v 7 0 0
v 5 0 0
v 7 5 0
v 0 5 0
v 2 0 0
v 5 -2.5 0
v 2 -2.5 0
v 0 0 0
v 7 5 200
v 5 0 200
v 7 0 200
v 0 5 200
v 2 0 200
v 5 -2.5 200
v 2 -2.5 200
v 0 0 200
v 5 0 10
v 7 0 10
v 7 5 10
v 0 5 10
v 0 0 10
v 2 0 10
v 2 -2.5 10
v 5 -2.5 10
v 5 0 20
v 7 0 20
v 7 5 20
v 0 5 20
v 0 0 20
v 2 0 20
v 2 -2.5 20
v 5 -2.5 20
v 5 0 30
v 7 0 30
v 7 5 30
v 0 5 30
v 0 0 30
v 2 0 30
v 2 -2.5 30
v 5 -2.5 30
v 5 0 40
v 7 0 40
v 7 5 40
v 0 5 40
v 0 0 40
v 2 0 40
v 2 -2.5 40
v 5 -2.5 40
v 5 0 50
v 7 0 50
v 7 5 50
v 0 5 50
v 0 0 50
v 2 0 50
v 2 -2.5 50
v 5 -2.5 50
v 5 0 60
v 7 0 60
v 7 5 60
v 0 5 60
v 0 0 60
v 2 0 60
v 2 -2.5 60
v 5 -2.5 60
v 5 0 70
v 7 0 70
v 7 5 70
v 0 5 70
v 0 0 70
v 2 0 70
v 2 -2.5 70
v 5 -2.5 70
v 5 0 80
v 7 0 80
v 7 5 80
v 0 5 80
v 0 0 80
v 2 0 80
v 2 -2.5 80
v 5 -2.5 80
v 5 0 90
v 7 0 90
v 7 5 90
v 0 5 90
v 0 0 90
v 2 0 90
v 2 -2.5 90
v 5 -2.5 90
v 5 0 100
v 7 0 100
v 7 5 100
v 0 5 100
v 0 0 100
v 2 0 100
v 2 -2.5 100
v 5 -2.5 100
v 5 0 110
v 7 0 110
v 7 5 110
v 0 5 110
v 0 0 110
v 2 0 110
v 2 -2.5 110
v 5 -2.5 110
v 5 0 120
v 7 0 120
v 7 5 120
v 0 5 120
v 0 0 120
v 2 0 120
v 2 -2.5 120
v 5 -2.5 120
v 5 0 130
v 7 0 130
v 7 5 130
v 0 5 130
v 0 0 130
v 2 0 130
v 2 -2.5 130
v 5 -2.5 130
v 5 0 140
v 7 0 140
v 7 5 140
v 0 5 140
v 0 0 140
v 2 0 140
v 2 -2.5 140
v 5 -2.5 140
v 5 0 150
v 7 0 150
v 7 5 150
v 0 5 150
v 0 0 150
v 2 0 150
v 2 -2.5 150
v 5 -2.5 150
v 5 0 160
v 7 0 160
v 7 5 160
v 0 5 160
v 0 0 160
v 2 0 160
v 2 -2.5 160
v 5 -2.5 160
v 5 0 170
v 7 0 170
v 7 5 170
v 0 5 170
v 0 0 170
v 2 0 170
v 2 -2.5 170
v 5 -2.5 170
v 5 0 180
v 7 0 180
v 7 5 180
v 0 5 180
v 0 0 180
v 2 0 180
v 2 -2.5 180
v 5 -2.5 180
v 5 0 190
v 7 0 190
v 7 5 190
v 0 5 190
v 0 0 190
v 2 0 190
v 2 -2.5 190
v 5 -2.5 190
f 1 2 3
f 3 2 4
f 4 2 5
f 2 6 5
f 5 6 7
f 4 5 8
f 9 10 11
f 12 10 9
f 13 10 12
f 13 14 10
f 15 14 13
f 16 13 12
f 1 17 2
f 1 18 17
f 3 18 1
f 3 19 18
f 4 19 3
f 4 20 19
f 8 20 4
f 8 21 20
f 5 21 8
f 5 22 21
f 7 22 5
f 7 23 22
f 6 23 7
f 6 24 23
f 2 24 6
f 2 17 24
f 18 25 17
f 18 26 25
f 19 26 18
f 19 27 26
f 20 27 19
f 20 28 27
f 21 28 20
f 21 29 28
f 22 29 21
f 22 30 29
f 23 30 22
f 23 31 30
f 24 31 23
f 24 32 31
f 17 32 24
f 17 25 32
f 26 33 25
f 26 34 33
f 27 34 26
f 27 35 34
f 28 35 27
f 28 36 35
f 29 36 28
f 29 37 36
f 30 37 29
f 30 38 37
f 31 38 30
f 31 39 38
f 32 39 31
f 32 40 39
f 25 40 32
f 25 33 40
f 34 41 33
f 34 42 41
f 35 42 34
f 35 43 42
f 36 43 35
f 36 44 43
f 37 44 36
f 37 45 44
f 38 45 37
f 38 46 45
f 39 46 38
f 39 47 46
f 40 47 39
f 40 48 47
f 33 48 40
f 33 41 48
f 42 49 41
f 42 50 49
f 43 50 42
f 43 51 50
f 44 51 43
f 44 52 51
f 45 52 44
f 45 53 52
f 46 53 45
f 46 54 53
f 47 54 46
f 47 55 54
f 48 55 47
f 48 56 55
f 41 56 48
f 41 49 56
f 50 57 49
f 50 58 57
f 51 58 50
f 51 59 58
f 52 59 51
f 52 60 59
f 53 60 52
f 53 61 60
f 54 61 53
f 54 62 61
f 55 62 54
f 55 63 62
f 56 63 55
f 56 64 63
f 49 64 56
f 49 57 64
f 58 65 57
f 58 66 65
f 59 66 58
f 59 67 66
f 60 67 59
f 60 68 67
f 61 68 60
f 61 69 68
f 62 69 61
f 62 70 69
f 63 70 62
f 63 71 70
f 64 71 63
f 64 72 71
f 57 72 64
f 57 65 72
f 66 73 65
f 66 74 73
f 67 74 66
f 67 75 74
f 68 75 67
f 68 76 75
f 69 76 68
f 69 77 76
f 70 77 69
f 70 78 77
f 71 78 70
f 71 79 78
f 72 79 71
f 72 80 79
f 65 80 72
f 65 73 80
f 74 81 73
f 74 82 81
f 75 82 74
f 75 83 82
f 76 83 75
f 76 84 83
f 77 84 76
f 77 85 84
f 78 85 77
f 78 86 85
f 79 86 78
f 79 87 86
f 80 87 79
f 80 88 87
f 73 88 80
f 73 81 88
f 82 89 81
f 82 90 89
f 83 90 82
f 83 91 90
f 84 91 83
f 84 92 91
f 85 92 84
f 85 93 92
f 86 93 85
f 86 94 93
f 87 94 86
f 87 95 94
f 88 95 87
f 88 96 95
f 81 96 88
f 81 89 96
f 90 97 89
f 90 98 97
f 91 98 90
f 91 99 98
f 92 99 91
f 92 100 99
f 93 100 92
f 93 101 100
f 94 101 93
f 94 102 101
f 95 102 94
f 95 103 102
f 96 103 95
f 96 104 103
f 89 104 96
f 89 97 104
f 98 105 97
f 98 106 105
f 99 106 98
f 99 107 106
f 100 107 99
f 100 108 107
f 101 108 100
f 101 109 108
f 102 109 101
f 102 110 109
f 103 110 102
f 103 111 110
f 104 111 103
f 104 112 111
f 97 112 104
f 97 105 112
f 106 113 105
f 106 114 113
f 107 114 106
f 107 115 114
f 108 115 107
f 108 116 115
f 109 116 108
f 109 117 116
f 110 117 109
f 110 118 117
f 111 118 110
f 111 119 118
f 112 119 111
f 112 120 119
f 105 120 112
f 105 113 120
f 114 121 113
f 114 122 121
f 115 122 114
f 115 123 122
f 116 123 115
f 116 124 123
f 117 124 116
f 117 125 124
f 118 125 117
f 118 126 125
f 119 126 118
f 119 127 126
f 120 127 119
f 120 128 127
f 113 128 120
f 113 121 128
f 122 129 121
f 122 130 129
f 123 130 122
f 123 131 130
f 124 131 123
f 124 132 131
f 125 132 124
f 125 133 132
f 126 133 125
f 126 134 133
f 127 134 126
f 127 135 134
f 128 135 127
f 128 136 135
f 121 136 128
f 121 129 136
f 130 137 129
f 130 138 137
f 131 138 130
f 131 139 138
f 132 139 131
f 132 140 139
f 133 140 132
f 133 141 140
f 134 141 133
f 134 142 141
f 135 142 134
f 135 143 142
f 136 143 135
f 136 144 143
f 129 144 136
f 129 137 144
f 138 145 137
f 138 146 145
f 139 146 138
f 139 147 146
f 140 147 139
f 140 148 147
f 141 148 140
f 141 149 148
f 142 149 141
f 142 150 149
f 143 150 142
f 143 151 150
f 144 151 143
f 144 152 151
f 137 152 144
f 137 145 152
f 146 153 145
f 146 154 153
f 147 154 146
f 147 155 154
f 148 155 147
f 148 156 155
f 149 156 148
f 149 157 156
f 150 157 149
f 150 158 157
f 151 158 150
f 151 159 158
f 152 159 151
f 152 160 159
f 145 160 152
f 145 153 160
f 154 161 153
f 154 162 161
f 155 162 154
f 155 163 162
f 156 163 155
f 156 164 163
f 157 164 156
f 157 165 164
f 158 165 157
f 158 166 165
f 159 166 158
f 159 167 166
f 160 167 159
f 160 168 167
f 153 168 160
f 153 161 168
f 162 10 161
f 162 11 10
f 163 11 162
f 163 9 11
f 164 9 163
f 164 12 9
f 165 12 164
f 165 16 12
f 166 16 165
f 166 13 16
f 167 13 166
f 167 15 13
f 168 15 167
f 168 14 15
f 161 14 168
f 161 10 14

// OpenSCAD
// file: Parts/Screw.scad
// created by IndiePandaaaaa | Lukas

TOLERANCE = .1;
$fn = $preview ? 30 : 75;

// metric standards                          M1   M2   M3   M4   M5 M6 M7   M8   M9  M10
function screw_metric_corehole(standard) = [.75, 1.6, 2.5, 3.3, 4.2, 5, 6, 6.8, 7.8, 8.5][standard - 1];
function screw_metric_borehole(standard) = [0, 0, 3.4, 4.5, 5.5, 6.6, 0, 9, 0, 11][standard - 1];
function screw_metric_countersunk_height(standard) = [0, 0, 1.7, 2.3, 2.8, 3.3, 0, 4.4, 0, 5.5][standard - 1];
function screw_metric_countersunk_od(standard) = standard * 2;

module screw_metric_countersunk(standard, length, unthreaded_length = 0, borehole_length = 0, tolerance = .15) {
  if (screw_metric_corehole(standard=standard) == 0) echo("ERROR: screw_metric_corehole value has not been set yet.");
  if (screw_metric_borehole(standard=standard) == 0) echo("ERROR: screw_metric_borehole value has not been set yet.");
  if (screw_metric_countersunk_height(standard=standard) == 0) echo("ERROR: screw_metric_countersunk_height value has not been set yet.");

  union() {
    translate(v=[0, 0, -.1]) {
      cylinder(h=.2 + borehole_length, d=screw_metric_countersunk_od(standard) + tolerance, center=false);
      translate(v=[0, 0, -screw_metric_countersunk_height(standard)]) {
        cylinder(h=screw_metric_countersunk_height(standard) + .01, d2=screw_metric_countersunk_od(standard) + tolerance, d1=screw_metric_borehole(standard) + tolerance, center=false);
        translate(v=[0, 0, -.1]) cylinder(h=.1, d=screw_metric_borehole(standard) + tolerance, center=false);
      }
    }
    translate(v=[0, 0, -length]) cylinder(h=length, d=screw_metric_corehole(standard) + tolerance, center=false);

    // unthreaded part
    translate(v=[0, 0, -.1 - screw_metric_countersunk_height(standard) - unthreaded_length]) cylinder(h=unthreaded_length + .1, d=screw_metric_borehole(standard) + tolerance, center=false);
  }
}

// TODO: module metric cylindric head screws

// TODO: module metric rounded head screws

function screw_wood_corehole(diameter) = diameter * 0.75;
function screw_wood_borehole(diameter) = diameter * 1.25;
function screw_wood_countersunk_height(diameter) = diameter * 0.75;

module screw_wood_countersunk(diameter, length, unthreaded_length = 0, tolerance = .15) {
  if (screw_metric_corehole(standard=standard) == 0) echo("ERROR: screw_metric_corehole value has not been set yet.");
  if (screw_metric_borehole(standard=standard) == 0) echo("ERROR: screw_metric_borehole value has not been set yet.");
  if (screw_metric_countersunk_height(standard=standard) == 0) echo("ERROR: screw_metric_countersunk_height value has not been set yet.");

  // TODO: add module for wood screws 
  union(){}
}

// TODO: module wood cylindric head screws

// TODO: module wood rounded head screws

function cone_diameter(diameter) = diameter * 2;
function cone_diameter_cutout(diameter) = diameter * 2 + 0.5;
function cone_height(diameter) = diameter * 0.75;

module screw(diameter, length = 12, cutout_sample = false) {
  module base_model(diameter, length, cone_height, cone_diameter, offset = 0) {
    rotate_extrude(angle=360) {
      polygon(
        [
          [0, 0],
          [(diameter + offset) / 2, 0],
          [(diameter + offset) / 2, (length + offset) - (cone_height + offset)],
          [(cone_diameter + offset) / 2, length + offset],
          [0, length + offset],
        ]
      );
    }
  }

  if (length < diameter) {
    echo("Screw is too short");
    length = diameter + 5;
    echo("New length is: ", length);
  }

  if (!cutout_sample) {
    translate([0, 0, -length])
      difference() {
        base_model(diameter, length, cone_height(diameter), cone_diameter(diameter));

        // top cross part
        translate([0, 0, length - (cone_height(diameter) - diameter / 2) + .1])
          difference() {
            rotate([0, 0, 45])
              rotate_extrude(angle=360) {
                polygon(
                  [
                    [0, 0],
                    [diameter * 1.4 / 2, 0],
                    [cone_diameter(diameter) / 3, cone_height(diameter) - diameter / 2],
                    [0, cone_height(diameter) - diameter / 2],
                  ]
                );
              }
            for (i = [0:1:3]) {
              rotate([0, 0, 90 * i])
                translate([diameter / 3.18 / 2, diameter / 3.18 / 2, 0]) cube(cone_height(diameter));
            }
          }
      }
  } else {
    offset = 0;
    diameter = cone_diameter_cutout(diameter) / 2; // is duplicated by function, used to reduce error
    translate([0, 0, -length - offset / 2]) {
      base_model(diameter, length, cone_height(diameter), cone_diameter(diameter), offset);
      translate([0, 0, length - .005]) cylinder(r=diameter, h=50);
    }
  }
}

module screw_corehole(diameter_screw, diameter_core, unthreaded_length, length = 12) {
  union() {
    screw(diameter=diameter_screw, length=unthreaded_length, cutout_sample=true);
    if (unthreaded_length < diameter_core - .1) {
      translate(v=[0, 0, -diameter_screw * .8]) cylinder(h=diameter_screw, d=diameter_screw + .3, center=false);
    }
    translate([0, 0, -length]) cylinder(d=diameter_core, h=length - unthreaded_length + .1);
  }
}

module screw_with_nut_metric(screw_length, diameter, square_channel = false, tolerance = .1) {
  function od(width) = ( (width / 2) / cos(30)) * 2; // calculates nut diameter from given width
  nut_thickness = [0.8, 1.6, 2.4, 3.2, 4, 5, 5.5, 6.5];
  nut_width = [2.5, 4, 5.5, 7.1, 8.1, 10.1, 11.1, 13.1];

  if (!(0 < diameter && diameter <= 8 && diameter == round(diameter))) {
    echo("module is only defined for integer values from M1 to M8.");
  } else {
    union() {
      if (!square_channel) {
        screw(diameter=diameter, length=screw_length, cutout_sample=true);

        translate([0, 0, -(screw_length * 2 - nut_thickness[diameter - 1])])
          cylinder(d=od(nut_width[diameter - 1]) + tolerance, h=screw_length, $fn=6);
      } else {
        screw(diameter=diameter, length=screw_length + diameter, cutout_sample=true);
        translate([-od(nut_width[diameter - 1]) / 2 - tolerance, -(nut_width[diameter - 1] / 2), -(screw_length)])
          cube([od(nut_width[diameter - 1]) + screw_length, nut_width[diameter - 1] + tolerance, nut_thickness[diameter - 1] + tolerance]);
      }
    }
  }
}

translate(v=[0, 0, 0]) screw(diameter=3.5, length=12, cutout_sample=false);
translate(v=[20, 0, 0]) screw_corehole(diameter_screw=3, diameter_core=2.5, unthreaded_length=15, length=20);
translate(v=[40, 0, 0]) screw_with_nut(screw_length=30, diameter=4, square_channel=false, tolerance=.1);
translate(v=[60, 0, 0]) SCREW_METRIC_COUNTERSUNK(standard=3, length=12, unthreaded_length=5, borehole_length=5);
// main file
// created by IndiePandaaaaa|Lukas
// encoding: utf-8

use <Parts/Screw.scad>

// made for Bosch Professional 216-305d
// model number: 1 609 B07 675

THICKNESS = 3;
TOLERANCE = .1;
CHAMFER = 1.5;
$fn = $preview ? 50 : 100;

// workpiece stop x-axis (measurements from the original workpiece support)
WORKPIECESUPPORT_WIDTH = 148;
WORKPIECESUPPORT_HOOK_DISTANCE = 92.2;
WORKPIECESUPPORT_HEIGHT = 88.1;

// vacuum adapter
VACUUM_OD = 34.2;
SPLITTED_PRINT = true;

module workpiece_stop() {
  workpiecestop_width = WORKPIECESUPPORT_WIDTH;
  workpiecestop_height = 70;
  workpiecestop_hook_distance = WORKPIECESUPPORT_HOOK_DISTANCE;

  hook_width = 11.1;
  hook_depth = 6.8;
  hook_height = 12.3;
  base_material_thickness = 2.3;

  module bosch_hook() {
    top_thickness = 1.6;
    hollow_depth = 2.85;
    hollow_height = 5.3;
    inner_piece_width = 7.5;
    translate([-base_material_thickness, hook_width, 0]) rotate([90, 0, 0]) union() {
      linear_extrude(hook_width) {
        polygon([
            [0, 0],
            [base_material_thickness, 0],
            [base_material_thickness, hook_height - top_thickness],
            [base_material_thickness + hollow_depth, hook_height - top_thickness],
            [base_material_thickness + hollow_depth, 0],
            [base_material_thickness + hook_depth, 0],
            [base_material_thickness + hook_depth, hook_height],
            [0, hook_height],
          ]);
      }
      translate([hook_depth, hook_height, hook_width]) rotate([0, 90, 180]) linear_extrude(hook_depth) {
        distance_to_center = (hook_width - inner_piece_width) / 2;
        polygon([
            [0, 0],
            [distance_to_center, 0],
            [distance_to_center, hook_height - hollow_height],
            [distance_to_center + inner_piece_width, hook_height - hollow_height],
            [distance_to_center + inner_piece_width, 0],
          ]);
      }
    }
  }

  translate([0, THICKNESS + hook_depth, -14 - hook_height]) rotate([0, 0, -90]) union() {
    translate([THICKNESS, -((workpiecestop_hook_distance + hook_width * 2) - workpiecestop_width) / 2, 14]) {
      bosch_hook();
      translate([0, workpiecestop_hook_distance + hook_width, 0]) bosch_hook();
    }
    cube([THICKNESS, workpiecestop_width, workpiecestop_height]);
  }
}

module vacuum_adapter(vacuum_diameter) {
  module saw_base(backspace_shape = false, rotation = 0, max_rotation = 48) {
    module wood_stops(rotation_guide = false) {
      for (i = [0:1]) mirror([0, i, 0]) translate([0, -16 / 2, 0]) rotate([0, 0, 180 - (rotation_guide? max_rotation:0)]
      ) difference() {// wood stops
        ws_size = [30, 140, 41];
        union() {
          cube(ws_size);
          if (rotation_guide)
            translate([-ws_size[1] + .1, 0, 0]) cube([ws_size[1], ws_size[1], ws_size[2]]);
        }
        translate([16.5, -.1, ws_size[2] - 16.3]) cube([ws_size[0], ws_size[1] + .2, ws_size[2]]);
        translate([3, 0, -.1]) rotate([0, 0, -(90 - max_rotation)]) cube(45);
        translate([-.1, -.1, 27]) rotate([atan(14 / 33), 0, 0]) cube(45);
      }
    }

    module central_connect() {
      translate([0, 0, 0]) difference() {// backside cylinder, connecting the wood stops
        bs_cy_size = [75.5 * 2, 15.2, 58, 33];
        translate([0, 0, -.05]) cylinder(d = bs_cy_size[0], h = bs_cy_size[1]);
        translate([0, 0, bs_cy_size[0] / 2 + 29 + 3]) sphere(d = bs_cy_size[0] * 1.45);
        translate([0, 0, -.1]) cylinder(r = bs_cy_size[3], h = bs_cy_size[1] + .2);
        translate([-.1, -bs_cy_size[0], -bs_cy_size[0] / 4]) cube(bs_cy_size[0] * 2);
      }
    }

    module rotating_base() {
      translate([0, 0, -40]) rotate([0, 0, rotation]) difference() {
        rb_size = [260, 40, 53.7, 2.5, 10, 35];
        union() {// rotating base
          cylinder(d = rb_size[0], h = rb_size[1]);
          translate([-100 + .1, 0, rb_size[1]]) {
            rotate([0, -90, 0]) cylinder(d2 = 90, d1 = rb_size[2], h = 33.8); // back cone
          }
        }
        translate([-rb_size[5] + 20, -rb_size[4] / 2, rb_size[1] - rb_size[4] + .1]) cube([rb_size[0], rb_size[4],
          rb_size[4]]); // base saw blade cutout
      }
    }

    difference() {
      if (!backspace_shape) {
        union() {
          wood_stops();
          color("#aa4400") rotating_base();
          central_connect();
        }
      }

      cutout_height = 1;
      translate([0, 0, -cutout_height]) rotate([0, 0, rotation]) linear_extrude(cutout_height + .1) projection()
        difference() {
          intersection() {
            translate([0, 0, .1]) cylinder(d = 260.1, h = .01);
            translate([-175, 0, 0]) cube(260, center = true);
          }
          union() {
            rotating_base();
            central_connect();
            wood_stops(true);

          }
        }
    }
    rb_size = [260, 40, 53.7, 2.5, 10, 35];
    translate([-100 - 7.72 + rb_size[3], 0, -.018]) difference() {
      rotate([0, 45, 0]) cylinder(d = rb_size[2], h = 5);
      translate([rb_size[3] * 3 + .3, rb_size[2] / 2, rb_size[3] - 1]) rotate([90, 0, 0]) cylinder(r = rb_size[3], h =
      rb_size[2]);
    }
  }

  module saw_head() {
    module saw_blade() {
      blade_size = [216, 5, 25, 260 / 2];
      union() {
        translate([blade_size[2], blade_size[1] / 2, -2]) rotate([90, 0, 0]) {
          for (i = [0:1]) {translate([blade_size[3] * i, blade_size[0] / 2, 0]) cylinder(d = blade_size[0], h =
          blade_size[1]);}
          cube([blade_size[3], blade_size[0], blade_size[1]]);
        }
      }
    }

    module saw_blade_case() {
      union() {
        sbc_size = [90, 51, 36.6, 95, 135 - 25, 57];
        translate([-sbc_size[4], -sbc_size[2] / 2, 0]) {
          translate([0, 0, sbc_size[3]]) cube([sbc_size[0], sbc_size[1], sbc_size[0]]);
          translate([0, 0, sbc_size[5]]) cube([sbc_size[0], sbc_size[2], sbc_size[3]]);
        }
      }
    }

    translate([-3, 0, 0]) union() {
      color("#777777") saw_blade();
      color("#bbbbbb") saw_blade_case();
    }
  }

  module airchannels() {
    module sawblade_airchannel() {
      va_size = [214.95, 83.75];
      difference() {
        union() {
          difference() {
            translate([0, 0, va_size[0] / 2]) scale([1, 0.75, 1]) sphere(va_size[0] / 2);
            translate([0, 0, 250 / 2 + 40]) cube(250, center = true);
          }
          translate([0, 0, 42]) scale([1, 0.75, 20 / va_size[1]]) sphere(va_size[1]);
          translate([0, -48 / 2, 40]) rotate([0, 0, 90]) cube([48, 80, 20]);
        }
        translate([250 / 2 - .1, 0, 0]) cube(250, center = true);
      }
      difference() {
        translate([-60, 0, 40 + 40]) scale([1, .5, 1]) sphere(52);
        translate([-60, 0, 50 + 70]) cube(120, center = true);
      }
    }

    module vacuum_airchannel() {
      airchannel_od = 37;
      translate([-70, -15, 43.5]) {
        rotate([-100, 0, 15]) {
          cylinder(d = airchannel_od, h = 50);
          scale([airchannel_od / 10, airchannel_od / 10, 1]) sphere(d = 10);
        }
        translate([-12, 40, -8]) rotate([-90, 0, 0]) {
          cylinder(d = airchannel_od, h = 45);
          translate([0, 0, 55 - (.05 + 10)]) cylinder(d = vacuum_diameter, h = 15);
        }
      }
    }

    color("#7777ff") union() {
      sawblade_airchannel();
      vacuum_airchannel();
    }
  }

  module mounting_screws() {
    module screw_nut(length, diameter, square_channel=false) {
      screw_length = [0, 0, 12, 40];
      nut_thickness = [0, 0, 2.4, 3.2];
      nut_diameter = [0, 0, 6.1, 7.95];
      nut_width = [0, 0, 5.5, 7.15];

      od_index = diameter - 1;

      rotate([90, 0, -90]) union() {
        if (!square_channel) {
          screw(diameter, screw_length[od_index], true);
          translate([0, 0, -(screw_length[od_index]*2 - nut_thickness[od_index])]) cylinder(d=nut_diameter[od_index] + TOLERANCE, h=screw_length[od_index], $fn=6);
        } else {
          screw(diameter, screw_length[od_index] + diameter, true);
          translate([-nut_diameter[od_index]/2 - TOLERANCE, -(nut_width[od_index]/2), -(screw_length[od_index])]) 
            cube([nut_diameter[od_index] + screw_length[od_index], nut_width[od_index] + TOLERANCE, nut_thickness[od_index] + TOLERANCE]);
        }
      }
    }

    // core hole M3 = 2.5;
    odM3 = [3, 2.5];

    //screw_corehole(diameter_screw=3, diameter_core=2.5, unthreaded_length=15, length=20);

    color("#222222") union() {
      for (i = [0:1]) {
        // top back: mounting accessories
        translate([-75, 30 - 60 * i, 67]) screw_nut(45, diameter=4);
        translate([-72, -50, 23]) screw_nut(42, diameter=4);

        // vacuum diameter exchange
        translate([-60 - 45 * i, 75, 22 + 25 * i]) rotate([90 + 180*i, 0, -90]) screw_nut(20, diameter=3, square_channel=true);

        // cone exchange
        translate([-100, -30, 30]) rotate([0, 0, 0]) screw_nut(20, diameter=3, square_channel=true);
        difference() {
          translate([-107, 46, 20]) rotate([0, 0, -90]) screw_nut(20, diameter=3, square_channel=true);
          translate([-107, 25 + 70 + .05, 20]) cube([10, 50, 10], center=true);
        }
      }
    }

    /*translate([-300, 0, 0]) difference() { // testpiece
      color("#555555") union() {
        cube([41, 25, 15]);
        cube([13, 25, 30]);
      }
      translate([0, 5, 22]) {
        screw_nut(12, diameter=3, square_channel=true);
        translate([0, 14, 0]) screw_nut(12, diameter=3, square_channel=false);
      }
      translate([0, 5, 7]) {
        screw_nut(40, diameter=4, square_channel=true);
        translate([0, 14, 0]) screw_nut(40, diameter=4, square_channel=false);
      }
      translate([30, 12.5, 7]) cylinder(d=7.3, h=20, $fn=6);
    }*/
  }

  module split_walls() {
    thickness_walls = .15;

    // back cut away
    translate([-68, 70 + thickness_walls, -2]) rotate([0, 0, -90]) cube([160, thickness_walls, 80]);
    translate([-50, 75 + thickness_walls, -2]) rotate([0, 0, -90]) cube([160, thickness_walls, 80]);

    // cone cutout for exchange
    translate([-95, 40, 0]) intersection() {
      translate([-18, 0, -2]) rotate([0, 0, -90]) cube([81, 18, 40 + thickness_walls]);
      difference() {
        pxyz = [0, 5, 10.5, 40, -7, -90 + 15];
        union() { 
          translate([-thickness_walls, 0, -2]) rotate([0, 0, -90]) cube([81, thickness_walls, 40]);
          translate([0, 0, 38]) rotate([90, 0, -90]) cube([81, thickness_walls, 18]);
          translate([0, 0, 38]) rotate([90, 90, -90]) cube([40, thickness_walls, 18]);
          translate([pxyz[0], pxyz[1], pxyz[2]]) rotate([pxyz[3], pxyz[4], pxyz[5]]) cube([100, thickness_walls, 40]);
        }
        translate([pxyz[0], pxyz[1], pxyz[2] + thickness_walls]) rotate([pxyz[3], pxyz[4], pxyz[5]]) cube([100, 100, 40]);
      }
    }
  }

  module adapter() {
    width = 80;
    height = 58 + 20;
    height_offset = 17;
    color("#ff7777") translate([0, -width / 2, 0]) union() {
      linear_extrude(height) {
        polygon([
            [0, 0],
            [42.5, (width - 58) / 2],
            [80, -40],
            [82, -40],
            [82, 120],
            [80, 120],
            [42, (width + 58) / 2],
            [0, width],
          ]);
      }

      translate([0, 0, height_offset]) cube([60, width, height - height_offset]);
      translate([40, -20, height_offset]) cube([25, 40, 33]);
      translate([0, 0, height_offset]) cube([75, 110, 40]);
      translate([0, 110.2, height_offset]) cube([60, 10, 40]); // vacuum plate
    }
  }

  //difference() {
  union() {
    translate([-112, 0, -1.5]) {
      adapter();
    }
    union() {
      saw_base();
      saw_head();
      airchannels();
      mounting_screws();

      if (SPLITTED_PRINT) {
        split_walls();
      }
    }
  }
}

module saw_insert_adjustment() {
  module washer(id, od, height) {
    difference() {
      cylinder(h = height, d = od, center = false);
      translate(v = [0,0,-.1]) cylinder(h = height+.2, d = id, center = false);
    }
  }

  module square_washer(height) {
    union() {
      cube(size = [10, 4, height], center = false);
      translate(v = [10-4, 3.5, -7.5+height]) cube(size = [4, 1, 7.5], center = false);
    }
  }

  translate(v = [10, 0, 0]) washer(4.2,9.6,.4);
  translate(v = [20, 0, 0]) square_washer(.4);
}

module perpendicular_setup_helper(blade_width) {
  linear_extrude(height = 200, center = false, convexity = 10, twist = 0, slices = 20, scale = 1.0) {
    square(size = [2+blade_width+2, 5], center = false);
    translate(v = [2, -2.5, 0]) square(size = [blade_width, 2.6], center = false);
  }
}

//translate([0, 150, 0]) workpiece_stop();
//vacuum_adapter(VACUUM_OD);
//translate(v = [0, 200, 0]); saw_insert_adjustment();
perpendicular_setup_helper(blade_width = 3);
